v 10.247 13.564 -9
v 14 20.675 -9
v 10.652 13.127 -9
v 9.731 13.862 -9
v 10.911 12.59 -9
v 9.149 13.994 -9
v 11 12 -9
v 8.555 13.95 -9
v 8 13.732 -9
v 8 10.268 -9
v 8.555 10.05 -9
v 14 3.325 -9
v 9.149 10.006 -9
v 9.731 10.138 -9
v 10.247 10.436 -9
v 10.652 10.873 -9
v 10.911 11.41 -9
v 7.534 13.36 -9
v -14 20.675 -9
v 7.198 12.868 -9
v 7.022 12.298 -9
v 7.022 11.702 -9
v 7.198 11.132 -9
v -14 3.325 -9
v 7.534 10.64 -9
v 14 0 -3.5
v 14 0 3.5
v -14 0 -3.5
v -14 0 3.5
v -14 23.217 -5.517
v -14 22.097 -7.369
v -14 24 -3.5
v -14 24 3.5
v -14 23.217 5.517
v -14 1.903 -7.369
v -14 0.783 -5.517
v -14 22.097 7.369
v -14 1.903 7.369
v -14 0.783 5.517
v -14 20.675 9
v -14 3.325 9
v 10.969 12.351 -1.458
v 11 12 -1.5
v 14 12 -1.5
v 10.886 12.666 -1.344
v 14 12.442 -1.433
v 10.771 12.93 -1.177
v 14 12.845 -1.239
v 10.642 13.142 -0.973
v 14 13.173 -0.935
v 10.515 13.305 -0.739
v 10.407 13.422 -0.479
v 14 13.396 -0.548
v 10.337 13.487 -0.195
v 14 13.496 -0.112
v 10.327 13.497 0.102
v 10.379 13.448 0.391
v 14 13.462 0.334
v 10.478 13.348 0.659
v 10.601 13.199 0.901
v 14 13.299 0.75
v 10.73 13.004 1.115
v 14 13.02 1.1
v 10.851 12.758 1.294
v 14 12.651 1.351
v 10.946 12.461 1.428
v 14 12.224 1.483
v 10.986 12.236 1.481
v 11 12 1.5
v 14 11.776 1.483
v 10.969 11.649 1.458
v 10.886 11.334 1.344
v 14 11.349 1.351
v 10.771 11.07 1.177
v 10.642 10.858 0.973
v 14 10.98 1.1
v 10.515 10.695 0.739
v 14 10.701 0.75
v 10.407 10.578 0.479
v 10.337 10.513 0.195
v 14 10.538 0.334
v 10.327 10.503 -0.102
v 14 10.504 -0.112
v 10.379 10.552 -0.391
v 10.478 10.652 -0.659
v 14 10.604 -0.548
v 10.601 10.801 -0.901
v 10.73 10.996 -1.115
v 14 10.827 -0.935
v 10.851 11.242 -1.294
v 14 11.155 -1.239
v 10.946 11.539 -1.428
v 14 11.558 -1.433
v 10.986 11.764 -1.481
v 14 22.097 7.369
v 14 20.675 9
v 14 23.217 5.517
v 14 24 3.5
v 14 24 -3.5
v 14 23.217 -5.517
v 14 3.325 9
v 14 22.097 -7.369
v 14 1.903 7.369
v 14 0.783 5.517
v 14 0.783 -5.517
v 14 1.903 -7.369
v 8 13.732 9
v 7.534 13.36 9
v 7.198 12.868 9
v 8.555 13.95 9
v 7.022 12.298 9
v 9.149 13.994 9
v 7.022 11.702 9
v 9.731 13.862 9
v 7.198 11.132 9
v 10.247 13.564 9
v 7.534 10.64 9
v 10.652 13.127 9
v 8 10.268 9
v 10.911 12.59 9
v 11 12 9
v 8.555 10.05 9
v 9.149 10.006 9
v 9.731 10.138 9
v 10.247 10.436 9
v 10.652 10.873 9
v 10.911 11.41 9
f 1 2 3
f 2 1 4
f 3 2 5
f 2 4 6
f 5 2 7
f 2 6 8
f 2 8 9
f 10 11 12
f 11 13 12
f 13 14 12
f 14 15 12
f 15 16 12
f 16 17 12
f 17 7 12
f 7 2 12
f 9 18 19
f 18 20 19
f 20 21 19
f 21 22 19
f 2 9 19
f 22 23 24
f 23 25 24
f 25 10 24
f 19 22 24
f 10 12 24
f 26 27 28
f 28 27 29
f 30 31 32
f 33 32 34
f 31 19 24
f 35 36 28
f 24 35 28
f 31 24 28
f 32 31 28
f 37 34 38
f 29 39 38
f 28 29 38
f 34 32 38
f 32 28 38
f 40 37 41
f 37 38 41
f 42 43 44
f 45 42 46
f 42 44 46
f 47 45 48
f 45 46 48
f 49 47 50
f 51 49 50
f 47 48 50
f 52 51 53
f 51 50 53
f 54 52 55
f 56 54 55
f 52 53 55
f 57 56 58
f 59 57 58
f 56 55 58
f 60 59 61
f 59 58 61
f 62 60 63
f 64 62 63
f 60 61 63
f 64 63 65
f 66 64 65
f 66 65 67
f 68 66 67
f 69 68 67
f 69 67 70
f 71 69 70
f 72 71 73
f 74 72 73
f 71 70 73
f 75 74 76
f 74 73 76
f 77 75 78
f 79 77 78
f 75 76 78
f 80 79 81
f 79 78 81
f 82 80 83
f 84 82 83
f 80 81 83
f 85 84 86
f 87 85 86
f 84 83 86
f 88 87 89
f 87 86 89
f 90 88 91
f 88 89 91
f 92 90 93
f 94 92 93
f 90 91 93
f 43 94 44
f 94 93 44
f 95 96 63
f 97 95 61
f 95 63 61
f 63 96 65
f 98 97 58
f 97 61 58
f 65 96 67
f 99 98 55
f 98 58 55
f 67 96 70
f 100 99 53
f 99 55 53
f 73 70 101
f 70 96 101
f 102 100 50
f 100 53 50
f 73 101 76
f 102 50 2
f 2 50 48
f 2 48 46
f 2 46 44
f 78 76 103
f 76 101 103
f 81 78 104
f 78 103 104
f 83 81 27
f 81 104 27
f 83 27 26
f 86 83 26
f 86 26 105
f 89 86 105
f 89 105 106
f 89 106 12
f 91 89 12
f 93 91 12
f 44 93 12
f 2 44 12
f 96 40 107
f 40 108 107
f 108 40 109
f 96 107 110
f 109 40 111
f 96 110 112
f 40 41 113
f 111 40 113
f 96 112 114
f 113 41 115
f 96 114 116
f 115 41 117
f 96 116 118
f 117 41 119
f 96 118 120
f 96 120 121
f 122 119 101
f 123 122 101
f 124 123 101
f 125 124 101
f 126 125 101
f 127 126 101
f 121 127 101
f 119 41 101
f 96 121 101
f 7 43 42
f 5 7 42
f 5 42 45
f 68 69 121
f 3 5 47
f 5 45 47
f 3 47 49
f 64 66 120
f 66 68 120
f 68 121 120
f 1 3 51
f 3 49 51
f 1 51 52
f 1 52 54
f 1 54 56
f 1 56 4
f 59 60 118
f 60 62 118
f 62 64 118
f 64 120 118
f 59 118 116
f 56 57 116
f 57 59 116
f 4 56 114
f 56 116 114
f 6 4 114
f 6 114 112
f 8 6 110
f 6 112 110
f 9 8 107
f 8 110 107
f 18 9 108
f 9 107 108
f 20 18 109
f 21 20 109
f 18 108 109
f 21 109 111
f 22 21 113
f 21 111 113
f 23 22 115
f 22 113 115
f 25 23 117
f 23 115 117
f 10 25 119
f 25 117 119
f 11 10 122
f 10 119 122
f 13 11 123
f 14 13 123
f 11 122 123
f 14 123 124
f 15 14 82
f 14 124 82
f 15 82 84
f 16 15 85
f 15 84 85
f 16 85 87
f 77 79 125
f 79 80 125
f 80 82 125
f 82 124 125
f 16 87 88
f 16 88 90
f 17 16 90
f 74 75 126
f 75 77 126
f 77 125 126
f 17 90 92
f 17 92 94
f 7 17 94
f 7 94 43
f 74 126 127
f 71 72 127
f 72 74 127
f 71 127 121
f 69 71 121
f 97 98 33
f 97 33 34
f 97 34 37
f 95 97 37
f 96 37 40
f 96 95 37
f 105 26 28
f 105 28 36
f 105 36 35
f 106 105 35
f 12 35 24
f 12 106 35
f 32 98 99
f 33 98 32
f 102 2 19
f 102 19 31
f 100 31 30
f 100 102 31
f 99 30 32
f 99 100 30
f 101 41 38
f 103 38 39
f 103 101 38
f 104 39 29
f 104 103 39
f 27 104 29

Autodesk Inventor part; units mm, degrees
ref_plane "YZ Plane" through (0, 0, 0) normal (1, 0, 0) x (0, 1, 0)
ref_plane "XZ Plane" through (0, 0, 0) normal (0, 1, 0) x (-1, 0, 0)
ref_plane "XY Plane" through (0, 0, 0) normal (0, 0, 1) x (1, 0, 0)
sketch "Sketch1" plane through (0, 0, 0) normal (0, 1, 0) x (-1, 0, 0)
  line L0 (14, 9) -> (-14, 9)
  line L1 (-14, 9) -> (-14, -9)
  line L2 (-14, -9) -> (14, -9)
  line L3 (14, -9) -> (14, 9)
  line L4 (0, 0) -> (0, -9) construction
  line L5 (0, 0) -> (-14, 0) construction
  dimension "d0" = 18
  dimension "d1" = 28
extrude "Extrusion1" add sketch "Sketch1" along normal blind 24
sketch "Sketch4" plane through (-14, 0, 9) normal (0, 0, 1) x (1, 0, 0)
  line L0 (0, 0) -> (0, 24) construction
  line L1 (0, 12) -> (31.0841, 12) construction
  circle A0 centre (23, 12) radius 2
  line L2 (28, 0) -> (28, 24) projected
  point P0 (14, 0)
  dimension "d4" = 4
  dimension "d5" = 5
extrude "Extrusion2" cut sketch "Sketch4" against normal up to next
sketch "Sketch5" plane through (14, 0, 9) normal (1, 0, 0) x (0, 0, -1)
  circle A0 centre (9, 12) radius 1.5
  line L0 (0, 0) -> (0, 24) construction
  line L1 (0, 12) -> (9.7328, 12) construction
  line L2 (9, 0) -> (9, 12) construction
  circle A1 centre (9, 12) radius 12.5
  circle A2 centre (9, 12) radius 15
  dimension "d8" = 3
  dimension "d9" = 25
  dimension "d10" = 30
extrude "Extrusion3" cut sketch "Sketch5" against normal up to next
sketch "Sketch6" plane through (0, 24, 0) normal (0, 1, 0) x (1, 0, 0)
  line L0 (0, 0) -> (30, 0) construction
  dimension "d13" = 30
properties part number "motor_quick"
